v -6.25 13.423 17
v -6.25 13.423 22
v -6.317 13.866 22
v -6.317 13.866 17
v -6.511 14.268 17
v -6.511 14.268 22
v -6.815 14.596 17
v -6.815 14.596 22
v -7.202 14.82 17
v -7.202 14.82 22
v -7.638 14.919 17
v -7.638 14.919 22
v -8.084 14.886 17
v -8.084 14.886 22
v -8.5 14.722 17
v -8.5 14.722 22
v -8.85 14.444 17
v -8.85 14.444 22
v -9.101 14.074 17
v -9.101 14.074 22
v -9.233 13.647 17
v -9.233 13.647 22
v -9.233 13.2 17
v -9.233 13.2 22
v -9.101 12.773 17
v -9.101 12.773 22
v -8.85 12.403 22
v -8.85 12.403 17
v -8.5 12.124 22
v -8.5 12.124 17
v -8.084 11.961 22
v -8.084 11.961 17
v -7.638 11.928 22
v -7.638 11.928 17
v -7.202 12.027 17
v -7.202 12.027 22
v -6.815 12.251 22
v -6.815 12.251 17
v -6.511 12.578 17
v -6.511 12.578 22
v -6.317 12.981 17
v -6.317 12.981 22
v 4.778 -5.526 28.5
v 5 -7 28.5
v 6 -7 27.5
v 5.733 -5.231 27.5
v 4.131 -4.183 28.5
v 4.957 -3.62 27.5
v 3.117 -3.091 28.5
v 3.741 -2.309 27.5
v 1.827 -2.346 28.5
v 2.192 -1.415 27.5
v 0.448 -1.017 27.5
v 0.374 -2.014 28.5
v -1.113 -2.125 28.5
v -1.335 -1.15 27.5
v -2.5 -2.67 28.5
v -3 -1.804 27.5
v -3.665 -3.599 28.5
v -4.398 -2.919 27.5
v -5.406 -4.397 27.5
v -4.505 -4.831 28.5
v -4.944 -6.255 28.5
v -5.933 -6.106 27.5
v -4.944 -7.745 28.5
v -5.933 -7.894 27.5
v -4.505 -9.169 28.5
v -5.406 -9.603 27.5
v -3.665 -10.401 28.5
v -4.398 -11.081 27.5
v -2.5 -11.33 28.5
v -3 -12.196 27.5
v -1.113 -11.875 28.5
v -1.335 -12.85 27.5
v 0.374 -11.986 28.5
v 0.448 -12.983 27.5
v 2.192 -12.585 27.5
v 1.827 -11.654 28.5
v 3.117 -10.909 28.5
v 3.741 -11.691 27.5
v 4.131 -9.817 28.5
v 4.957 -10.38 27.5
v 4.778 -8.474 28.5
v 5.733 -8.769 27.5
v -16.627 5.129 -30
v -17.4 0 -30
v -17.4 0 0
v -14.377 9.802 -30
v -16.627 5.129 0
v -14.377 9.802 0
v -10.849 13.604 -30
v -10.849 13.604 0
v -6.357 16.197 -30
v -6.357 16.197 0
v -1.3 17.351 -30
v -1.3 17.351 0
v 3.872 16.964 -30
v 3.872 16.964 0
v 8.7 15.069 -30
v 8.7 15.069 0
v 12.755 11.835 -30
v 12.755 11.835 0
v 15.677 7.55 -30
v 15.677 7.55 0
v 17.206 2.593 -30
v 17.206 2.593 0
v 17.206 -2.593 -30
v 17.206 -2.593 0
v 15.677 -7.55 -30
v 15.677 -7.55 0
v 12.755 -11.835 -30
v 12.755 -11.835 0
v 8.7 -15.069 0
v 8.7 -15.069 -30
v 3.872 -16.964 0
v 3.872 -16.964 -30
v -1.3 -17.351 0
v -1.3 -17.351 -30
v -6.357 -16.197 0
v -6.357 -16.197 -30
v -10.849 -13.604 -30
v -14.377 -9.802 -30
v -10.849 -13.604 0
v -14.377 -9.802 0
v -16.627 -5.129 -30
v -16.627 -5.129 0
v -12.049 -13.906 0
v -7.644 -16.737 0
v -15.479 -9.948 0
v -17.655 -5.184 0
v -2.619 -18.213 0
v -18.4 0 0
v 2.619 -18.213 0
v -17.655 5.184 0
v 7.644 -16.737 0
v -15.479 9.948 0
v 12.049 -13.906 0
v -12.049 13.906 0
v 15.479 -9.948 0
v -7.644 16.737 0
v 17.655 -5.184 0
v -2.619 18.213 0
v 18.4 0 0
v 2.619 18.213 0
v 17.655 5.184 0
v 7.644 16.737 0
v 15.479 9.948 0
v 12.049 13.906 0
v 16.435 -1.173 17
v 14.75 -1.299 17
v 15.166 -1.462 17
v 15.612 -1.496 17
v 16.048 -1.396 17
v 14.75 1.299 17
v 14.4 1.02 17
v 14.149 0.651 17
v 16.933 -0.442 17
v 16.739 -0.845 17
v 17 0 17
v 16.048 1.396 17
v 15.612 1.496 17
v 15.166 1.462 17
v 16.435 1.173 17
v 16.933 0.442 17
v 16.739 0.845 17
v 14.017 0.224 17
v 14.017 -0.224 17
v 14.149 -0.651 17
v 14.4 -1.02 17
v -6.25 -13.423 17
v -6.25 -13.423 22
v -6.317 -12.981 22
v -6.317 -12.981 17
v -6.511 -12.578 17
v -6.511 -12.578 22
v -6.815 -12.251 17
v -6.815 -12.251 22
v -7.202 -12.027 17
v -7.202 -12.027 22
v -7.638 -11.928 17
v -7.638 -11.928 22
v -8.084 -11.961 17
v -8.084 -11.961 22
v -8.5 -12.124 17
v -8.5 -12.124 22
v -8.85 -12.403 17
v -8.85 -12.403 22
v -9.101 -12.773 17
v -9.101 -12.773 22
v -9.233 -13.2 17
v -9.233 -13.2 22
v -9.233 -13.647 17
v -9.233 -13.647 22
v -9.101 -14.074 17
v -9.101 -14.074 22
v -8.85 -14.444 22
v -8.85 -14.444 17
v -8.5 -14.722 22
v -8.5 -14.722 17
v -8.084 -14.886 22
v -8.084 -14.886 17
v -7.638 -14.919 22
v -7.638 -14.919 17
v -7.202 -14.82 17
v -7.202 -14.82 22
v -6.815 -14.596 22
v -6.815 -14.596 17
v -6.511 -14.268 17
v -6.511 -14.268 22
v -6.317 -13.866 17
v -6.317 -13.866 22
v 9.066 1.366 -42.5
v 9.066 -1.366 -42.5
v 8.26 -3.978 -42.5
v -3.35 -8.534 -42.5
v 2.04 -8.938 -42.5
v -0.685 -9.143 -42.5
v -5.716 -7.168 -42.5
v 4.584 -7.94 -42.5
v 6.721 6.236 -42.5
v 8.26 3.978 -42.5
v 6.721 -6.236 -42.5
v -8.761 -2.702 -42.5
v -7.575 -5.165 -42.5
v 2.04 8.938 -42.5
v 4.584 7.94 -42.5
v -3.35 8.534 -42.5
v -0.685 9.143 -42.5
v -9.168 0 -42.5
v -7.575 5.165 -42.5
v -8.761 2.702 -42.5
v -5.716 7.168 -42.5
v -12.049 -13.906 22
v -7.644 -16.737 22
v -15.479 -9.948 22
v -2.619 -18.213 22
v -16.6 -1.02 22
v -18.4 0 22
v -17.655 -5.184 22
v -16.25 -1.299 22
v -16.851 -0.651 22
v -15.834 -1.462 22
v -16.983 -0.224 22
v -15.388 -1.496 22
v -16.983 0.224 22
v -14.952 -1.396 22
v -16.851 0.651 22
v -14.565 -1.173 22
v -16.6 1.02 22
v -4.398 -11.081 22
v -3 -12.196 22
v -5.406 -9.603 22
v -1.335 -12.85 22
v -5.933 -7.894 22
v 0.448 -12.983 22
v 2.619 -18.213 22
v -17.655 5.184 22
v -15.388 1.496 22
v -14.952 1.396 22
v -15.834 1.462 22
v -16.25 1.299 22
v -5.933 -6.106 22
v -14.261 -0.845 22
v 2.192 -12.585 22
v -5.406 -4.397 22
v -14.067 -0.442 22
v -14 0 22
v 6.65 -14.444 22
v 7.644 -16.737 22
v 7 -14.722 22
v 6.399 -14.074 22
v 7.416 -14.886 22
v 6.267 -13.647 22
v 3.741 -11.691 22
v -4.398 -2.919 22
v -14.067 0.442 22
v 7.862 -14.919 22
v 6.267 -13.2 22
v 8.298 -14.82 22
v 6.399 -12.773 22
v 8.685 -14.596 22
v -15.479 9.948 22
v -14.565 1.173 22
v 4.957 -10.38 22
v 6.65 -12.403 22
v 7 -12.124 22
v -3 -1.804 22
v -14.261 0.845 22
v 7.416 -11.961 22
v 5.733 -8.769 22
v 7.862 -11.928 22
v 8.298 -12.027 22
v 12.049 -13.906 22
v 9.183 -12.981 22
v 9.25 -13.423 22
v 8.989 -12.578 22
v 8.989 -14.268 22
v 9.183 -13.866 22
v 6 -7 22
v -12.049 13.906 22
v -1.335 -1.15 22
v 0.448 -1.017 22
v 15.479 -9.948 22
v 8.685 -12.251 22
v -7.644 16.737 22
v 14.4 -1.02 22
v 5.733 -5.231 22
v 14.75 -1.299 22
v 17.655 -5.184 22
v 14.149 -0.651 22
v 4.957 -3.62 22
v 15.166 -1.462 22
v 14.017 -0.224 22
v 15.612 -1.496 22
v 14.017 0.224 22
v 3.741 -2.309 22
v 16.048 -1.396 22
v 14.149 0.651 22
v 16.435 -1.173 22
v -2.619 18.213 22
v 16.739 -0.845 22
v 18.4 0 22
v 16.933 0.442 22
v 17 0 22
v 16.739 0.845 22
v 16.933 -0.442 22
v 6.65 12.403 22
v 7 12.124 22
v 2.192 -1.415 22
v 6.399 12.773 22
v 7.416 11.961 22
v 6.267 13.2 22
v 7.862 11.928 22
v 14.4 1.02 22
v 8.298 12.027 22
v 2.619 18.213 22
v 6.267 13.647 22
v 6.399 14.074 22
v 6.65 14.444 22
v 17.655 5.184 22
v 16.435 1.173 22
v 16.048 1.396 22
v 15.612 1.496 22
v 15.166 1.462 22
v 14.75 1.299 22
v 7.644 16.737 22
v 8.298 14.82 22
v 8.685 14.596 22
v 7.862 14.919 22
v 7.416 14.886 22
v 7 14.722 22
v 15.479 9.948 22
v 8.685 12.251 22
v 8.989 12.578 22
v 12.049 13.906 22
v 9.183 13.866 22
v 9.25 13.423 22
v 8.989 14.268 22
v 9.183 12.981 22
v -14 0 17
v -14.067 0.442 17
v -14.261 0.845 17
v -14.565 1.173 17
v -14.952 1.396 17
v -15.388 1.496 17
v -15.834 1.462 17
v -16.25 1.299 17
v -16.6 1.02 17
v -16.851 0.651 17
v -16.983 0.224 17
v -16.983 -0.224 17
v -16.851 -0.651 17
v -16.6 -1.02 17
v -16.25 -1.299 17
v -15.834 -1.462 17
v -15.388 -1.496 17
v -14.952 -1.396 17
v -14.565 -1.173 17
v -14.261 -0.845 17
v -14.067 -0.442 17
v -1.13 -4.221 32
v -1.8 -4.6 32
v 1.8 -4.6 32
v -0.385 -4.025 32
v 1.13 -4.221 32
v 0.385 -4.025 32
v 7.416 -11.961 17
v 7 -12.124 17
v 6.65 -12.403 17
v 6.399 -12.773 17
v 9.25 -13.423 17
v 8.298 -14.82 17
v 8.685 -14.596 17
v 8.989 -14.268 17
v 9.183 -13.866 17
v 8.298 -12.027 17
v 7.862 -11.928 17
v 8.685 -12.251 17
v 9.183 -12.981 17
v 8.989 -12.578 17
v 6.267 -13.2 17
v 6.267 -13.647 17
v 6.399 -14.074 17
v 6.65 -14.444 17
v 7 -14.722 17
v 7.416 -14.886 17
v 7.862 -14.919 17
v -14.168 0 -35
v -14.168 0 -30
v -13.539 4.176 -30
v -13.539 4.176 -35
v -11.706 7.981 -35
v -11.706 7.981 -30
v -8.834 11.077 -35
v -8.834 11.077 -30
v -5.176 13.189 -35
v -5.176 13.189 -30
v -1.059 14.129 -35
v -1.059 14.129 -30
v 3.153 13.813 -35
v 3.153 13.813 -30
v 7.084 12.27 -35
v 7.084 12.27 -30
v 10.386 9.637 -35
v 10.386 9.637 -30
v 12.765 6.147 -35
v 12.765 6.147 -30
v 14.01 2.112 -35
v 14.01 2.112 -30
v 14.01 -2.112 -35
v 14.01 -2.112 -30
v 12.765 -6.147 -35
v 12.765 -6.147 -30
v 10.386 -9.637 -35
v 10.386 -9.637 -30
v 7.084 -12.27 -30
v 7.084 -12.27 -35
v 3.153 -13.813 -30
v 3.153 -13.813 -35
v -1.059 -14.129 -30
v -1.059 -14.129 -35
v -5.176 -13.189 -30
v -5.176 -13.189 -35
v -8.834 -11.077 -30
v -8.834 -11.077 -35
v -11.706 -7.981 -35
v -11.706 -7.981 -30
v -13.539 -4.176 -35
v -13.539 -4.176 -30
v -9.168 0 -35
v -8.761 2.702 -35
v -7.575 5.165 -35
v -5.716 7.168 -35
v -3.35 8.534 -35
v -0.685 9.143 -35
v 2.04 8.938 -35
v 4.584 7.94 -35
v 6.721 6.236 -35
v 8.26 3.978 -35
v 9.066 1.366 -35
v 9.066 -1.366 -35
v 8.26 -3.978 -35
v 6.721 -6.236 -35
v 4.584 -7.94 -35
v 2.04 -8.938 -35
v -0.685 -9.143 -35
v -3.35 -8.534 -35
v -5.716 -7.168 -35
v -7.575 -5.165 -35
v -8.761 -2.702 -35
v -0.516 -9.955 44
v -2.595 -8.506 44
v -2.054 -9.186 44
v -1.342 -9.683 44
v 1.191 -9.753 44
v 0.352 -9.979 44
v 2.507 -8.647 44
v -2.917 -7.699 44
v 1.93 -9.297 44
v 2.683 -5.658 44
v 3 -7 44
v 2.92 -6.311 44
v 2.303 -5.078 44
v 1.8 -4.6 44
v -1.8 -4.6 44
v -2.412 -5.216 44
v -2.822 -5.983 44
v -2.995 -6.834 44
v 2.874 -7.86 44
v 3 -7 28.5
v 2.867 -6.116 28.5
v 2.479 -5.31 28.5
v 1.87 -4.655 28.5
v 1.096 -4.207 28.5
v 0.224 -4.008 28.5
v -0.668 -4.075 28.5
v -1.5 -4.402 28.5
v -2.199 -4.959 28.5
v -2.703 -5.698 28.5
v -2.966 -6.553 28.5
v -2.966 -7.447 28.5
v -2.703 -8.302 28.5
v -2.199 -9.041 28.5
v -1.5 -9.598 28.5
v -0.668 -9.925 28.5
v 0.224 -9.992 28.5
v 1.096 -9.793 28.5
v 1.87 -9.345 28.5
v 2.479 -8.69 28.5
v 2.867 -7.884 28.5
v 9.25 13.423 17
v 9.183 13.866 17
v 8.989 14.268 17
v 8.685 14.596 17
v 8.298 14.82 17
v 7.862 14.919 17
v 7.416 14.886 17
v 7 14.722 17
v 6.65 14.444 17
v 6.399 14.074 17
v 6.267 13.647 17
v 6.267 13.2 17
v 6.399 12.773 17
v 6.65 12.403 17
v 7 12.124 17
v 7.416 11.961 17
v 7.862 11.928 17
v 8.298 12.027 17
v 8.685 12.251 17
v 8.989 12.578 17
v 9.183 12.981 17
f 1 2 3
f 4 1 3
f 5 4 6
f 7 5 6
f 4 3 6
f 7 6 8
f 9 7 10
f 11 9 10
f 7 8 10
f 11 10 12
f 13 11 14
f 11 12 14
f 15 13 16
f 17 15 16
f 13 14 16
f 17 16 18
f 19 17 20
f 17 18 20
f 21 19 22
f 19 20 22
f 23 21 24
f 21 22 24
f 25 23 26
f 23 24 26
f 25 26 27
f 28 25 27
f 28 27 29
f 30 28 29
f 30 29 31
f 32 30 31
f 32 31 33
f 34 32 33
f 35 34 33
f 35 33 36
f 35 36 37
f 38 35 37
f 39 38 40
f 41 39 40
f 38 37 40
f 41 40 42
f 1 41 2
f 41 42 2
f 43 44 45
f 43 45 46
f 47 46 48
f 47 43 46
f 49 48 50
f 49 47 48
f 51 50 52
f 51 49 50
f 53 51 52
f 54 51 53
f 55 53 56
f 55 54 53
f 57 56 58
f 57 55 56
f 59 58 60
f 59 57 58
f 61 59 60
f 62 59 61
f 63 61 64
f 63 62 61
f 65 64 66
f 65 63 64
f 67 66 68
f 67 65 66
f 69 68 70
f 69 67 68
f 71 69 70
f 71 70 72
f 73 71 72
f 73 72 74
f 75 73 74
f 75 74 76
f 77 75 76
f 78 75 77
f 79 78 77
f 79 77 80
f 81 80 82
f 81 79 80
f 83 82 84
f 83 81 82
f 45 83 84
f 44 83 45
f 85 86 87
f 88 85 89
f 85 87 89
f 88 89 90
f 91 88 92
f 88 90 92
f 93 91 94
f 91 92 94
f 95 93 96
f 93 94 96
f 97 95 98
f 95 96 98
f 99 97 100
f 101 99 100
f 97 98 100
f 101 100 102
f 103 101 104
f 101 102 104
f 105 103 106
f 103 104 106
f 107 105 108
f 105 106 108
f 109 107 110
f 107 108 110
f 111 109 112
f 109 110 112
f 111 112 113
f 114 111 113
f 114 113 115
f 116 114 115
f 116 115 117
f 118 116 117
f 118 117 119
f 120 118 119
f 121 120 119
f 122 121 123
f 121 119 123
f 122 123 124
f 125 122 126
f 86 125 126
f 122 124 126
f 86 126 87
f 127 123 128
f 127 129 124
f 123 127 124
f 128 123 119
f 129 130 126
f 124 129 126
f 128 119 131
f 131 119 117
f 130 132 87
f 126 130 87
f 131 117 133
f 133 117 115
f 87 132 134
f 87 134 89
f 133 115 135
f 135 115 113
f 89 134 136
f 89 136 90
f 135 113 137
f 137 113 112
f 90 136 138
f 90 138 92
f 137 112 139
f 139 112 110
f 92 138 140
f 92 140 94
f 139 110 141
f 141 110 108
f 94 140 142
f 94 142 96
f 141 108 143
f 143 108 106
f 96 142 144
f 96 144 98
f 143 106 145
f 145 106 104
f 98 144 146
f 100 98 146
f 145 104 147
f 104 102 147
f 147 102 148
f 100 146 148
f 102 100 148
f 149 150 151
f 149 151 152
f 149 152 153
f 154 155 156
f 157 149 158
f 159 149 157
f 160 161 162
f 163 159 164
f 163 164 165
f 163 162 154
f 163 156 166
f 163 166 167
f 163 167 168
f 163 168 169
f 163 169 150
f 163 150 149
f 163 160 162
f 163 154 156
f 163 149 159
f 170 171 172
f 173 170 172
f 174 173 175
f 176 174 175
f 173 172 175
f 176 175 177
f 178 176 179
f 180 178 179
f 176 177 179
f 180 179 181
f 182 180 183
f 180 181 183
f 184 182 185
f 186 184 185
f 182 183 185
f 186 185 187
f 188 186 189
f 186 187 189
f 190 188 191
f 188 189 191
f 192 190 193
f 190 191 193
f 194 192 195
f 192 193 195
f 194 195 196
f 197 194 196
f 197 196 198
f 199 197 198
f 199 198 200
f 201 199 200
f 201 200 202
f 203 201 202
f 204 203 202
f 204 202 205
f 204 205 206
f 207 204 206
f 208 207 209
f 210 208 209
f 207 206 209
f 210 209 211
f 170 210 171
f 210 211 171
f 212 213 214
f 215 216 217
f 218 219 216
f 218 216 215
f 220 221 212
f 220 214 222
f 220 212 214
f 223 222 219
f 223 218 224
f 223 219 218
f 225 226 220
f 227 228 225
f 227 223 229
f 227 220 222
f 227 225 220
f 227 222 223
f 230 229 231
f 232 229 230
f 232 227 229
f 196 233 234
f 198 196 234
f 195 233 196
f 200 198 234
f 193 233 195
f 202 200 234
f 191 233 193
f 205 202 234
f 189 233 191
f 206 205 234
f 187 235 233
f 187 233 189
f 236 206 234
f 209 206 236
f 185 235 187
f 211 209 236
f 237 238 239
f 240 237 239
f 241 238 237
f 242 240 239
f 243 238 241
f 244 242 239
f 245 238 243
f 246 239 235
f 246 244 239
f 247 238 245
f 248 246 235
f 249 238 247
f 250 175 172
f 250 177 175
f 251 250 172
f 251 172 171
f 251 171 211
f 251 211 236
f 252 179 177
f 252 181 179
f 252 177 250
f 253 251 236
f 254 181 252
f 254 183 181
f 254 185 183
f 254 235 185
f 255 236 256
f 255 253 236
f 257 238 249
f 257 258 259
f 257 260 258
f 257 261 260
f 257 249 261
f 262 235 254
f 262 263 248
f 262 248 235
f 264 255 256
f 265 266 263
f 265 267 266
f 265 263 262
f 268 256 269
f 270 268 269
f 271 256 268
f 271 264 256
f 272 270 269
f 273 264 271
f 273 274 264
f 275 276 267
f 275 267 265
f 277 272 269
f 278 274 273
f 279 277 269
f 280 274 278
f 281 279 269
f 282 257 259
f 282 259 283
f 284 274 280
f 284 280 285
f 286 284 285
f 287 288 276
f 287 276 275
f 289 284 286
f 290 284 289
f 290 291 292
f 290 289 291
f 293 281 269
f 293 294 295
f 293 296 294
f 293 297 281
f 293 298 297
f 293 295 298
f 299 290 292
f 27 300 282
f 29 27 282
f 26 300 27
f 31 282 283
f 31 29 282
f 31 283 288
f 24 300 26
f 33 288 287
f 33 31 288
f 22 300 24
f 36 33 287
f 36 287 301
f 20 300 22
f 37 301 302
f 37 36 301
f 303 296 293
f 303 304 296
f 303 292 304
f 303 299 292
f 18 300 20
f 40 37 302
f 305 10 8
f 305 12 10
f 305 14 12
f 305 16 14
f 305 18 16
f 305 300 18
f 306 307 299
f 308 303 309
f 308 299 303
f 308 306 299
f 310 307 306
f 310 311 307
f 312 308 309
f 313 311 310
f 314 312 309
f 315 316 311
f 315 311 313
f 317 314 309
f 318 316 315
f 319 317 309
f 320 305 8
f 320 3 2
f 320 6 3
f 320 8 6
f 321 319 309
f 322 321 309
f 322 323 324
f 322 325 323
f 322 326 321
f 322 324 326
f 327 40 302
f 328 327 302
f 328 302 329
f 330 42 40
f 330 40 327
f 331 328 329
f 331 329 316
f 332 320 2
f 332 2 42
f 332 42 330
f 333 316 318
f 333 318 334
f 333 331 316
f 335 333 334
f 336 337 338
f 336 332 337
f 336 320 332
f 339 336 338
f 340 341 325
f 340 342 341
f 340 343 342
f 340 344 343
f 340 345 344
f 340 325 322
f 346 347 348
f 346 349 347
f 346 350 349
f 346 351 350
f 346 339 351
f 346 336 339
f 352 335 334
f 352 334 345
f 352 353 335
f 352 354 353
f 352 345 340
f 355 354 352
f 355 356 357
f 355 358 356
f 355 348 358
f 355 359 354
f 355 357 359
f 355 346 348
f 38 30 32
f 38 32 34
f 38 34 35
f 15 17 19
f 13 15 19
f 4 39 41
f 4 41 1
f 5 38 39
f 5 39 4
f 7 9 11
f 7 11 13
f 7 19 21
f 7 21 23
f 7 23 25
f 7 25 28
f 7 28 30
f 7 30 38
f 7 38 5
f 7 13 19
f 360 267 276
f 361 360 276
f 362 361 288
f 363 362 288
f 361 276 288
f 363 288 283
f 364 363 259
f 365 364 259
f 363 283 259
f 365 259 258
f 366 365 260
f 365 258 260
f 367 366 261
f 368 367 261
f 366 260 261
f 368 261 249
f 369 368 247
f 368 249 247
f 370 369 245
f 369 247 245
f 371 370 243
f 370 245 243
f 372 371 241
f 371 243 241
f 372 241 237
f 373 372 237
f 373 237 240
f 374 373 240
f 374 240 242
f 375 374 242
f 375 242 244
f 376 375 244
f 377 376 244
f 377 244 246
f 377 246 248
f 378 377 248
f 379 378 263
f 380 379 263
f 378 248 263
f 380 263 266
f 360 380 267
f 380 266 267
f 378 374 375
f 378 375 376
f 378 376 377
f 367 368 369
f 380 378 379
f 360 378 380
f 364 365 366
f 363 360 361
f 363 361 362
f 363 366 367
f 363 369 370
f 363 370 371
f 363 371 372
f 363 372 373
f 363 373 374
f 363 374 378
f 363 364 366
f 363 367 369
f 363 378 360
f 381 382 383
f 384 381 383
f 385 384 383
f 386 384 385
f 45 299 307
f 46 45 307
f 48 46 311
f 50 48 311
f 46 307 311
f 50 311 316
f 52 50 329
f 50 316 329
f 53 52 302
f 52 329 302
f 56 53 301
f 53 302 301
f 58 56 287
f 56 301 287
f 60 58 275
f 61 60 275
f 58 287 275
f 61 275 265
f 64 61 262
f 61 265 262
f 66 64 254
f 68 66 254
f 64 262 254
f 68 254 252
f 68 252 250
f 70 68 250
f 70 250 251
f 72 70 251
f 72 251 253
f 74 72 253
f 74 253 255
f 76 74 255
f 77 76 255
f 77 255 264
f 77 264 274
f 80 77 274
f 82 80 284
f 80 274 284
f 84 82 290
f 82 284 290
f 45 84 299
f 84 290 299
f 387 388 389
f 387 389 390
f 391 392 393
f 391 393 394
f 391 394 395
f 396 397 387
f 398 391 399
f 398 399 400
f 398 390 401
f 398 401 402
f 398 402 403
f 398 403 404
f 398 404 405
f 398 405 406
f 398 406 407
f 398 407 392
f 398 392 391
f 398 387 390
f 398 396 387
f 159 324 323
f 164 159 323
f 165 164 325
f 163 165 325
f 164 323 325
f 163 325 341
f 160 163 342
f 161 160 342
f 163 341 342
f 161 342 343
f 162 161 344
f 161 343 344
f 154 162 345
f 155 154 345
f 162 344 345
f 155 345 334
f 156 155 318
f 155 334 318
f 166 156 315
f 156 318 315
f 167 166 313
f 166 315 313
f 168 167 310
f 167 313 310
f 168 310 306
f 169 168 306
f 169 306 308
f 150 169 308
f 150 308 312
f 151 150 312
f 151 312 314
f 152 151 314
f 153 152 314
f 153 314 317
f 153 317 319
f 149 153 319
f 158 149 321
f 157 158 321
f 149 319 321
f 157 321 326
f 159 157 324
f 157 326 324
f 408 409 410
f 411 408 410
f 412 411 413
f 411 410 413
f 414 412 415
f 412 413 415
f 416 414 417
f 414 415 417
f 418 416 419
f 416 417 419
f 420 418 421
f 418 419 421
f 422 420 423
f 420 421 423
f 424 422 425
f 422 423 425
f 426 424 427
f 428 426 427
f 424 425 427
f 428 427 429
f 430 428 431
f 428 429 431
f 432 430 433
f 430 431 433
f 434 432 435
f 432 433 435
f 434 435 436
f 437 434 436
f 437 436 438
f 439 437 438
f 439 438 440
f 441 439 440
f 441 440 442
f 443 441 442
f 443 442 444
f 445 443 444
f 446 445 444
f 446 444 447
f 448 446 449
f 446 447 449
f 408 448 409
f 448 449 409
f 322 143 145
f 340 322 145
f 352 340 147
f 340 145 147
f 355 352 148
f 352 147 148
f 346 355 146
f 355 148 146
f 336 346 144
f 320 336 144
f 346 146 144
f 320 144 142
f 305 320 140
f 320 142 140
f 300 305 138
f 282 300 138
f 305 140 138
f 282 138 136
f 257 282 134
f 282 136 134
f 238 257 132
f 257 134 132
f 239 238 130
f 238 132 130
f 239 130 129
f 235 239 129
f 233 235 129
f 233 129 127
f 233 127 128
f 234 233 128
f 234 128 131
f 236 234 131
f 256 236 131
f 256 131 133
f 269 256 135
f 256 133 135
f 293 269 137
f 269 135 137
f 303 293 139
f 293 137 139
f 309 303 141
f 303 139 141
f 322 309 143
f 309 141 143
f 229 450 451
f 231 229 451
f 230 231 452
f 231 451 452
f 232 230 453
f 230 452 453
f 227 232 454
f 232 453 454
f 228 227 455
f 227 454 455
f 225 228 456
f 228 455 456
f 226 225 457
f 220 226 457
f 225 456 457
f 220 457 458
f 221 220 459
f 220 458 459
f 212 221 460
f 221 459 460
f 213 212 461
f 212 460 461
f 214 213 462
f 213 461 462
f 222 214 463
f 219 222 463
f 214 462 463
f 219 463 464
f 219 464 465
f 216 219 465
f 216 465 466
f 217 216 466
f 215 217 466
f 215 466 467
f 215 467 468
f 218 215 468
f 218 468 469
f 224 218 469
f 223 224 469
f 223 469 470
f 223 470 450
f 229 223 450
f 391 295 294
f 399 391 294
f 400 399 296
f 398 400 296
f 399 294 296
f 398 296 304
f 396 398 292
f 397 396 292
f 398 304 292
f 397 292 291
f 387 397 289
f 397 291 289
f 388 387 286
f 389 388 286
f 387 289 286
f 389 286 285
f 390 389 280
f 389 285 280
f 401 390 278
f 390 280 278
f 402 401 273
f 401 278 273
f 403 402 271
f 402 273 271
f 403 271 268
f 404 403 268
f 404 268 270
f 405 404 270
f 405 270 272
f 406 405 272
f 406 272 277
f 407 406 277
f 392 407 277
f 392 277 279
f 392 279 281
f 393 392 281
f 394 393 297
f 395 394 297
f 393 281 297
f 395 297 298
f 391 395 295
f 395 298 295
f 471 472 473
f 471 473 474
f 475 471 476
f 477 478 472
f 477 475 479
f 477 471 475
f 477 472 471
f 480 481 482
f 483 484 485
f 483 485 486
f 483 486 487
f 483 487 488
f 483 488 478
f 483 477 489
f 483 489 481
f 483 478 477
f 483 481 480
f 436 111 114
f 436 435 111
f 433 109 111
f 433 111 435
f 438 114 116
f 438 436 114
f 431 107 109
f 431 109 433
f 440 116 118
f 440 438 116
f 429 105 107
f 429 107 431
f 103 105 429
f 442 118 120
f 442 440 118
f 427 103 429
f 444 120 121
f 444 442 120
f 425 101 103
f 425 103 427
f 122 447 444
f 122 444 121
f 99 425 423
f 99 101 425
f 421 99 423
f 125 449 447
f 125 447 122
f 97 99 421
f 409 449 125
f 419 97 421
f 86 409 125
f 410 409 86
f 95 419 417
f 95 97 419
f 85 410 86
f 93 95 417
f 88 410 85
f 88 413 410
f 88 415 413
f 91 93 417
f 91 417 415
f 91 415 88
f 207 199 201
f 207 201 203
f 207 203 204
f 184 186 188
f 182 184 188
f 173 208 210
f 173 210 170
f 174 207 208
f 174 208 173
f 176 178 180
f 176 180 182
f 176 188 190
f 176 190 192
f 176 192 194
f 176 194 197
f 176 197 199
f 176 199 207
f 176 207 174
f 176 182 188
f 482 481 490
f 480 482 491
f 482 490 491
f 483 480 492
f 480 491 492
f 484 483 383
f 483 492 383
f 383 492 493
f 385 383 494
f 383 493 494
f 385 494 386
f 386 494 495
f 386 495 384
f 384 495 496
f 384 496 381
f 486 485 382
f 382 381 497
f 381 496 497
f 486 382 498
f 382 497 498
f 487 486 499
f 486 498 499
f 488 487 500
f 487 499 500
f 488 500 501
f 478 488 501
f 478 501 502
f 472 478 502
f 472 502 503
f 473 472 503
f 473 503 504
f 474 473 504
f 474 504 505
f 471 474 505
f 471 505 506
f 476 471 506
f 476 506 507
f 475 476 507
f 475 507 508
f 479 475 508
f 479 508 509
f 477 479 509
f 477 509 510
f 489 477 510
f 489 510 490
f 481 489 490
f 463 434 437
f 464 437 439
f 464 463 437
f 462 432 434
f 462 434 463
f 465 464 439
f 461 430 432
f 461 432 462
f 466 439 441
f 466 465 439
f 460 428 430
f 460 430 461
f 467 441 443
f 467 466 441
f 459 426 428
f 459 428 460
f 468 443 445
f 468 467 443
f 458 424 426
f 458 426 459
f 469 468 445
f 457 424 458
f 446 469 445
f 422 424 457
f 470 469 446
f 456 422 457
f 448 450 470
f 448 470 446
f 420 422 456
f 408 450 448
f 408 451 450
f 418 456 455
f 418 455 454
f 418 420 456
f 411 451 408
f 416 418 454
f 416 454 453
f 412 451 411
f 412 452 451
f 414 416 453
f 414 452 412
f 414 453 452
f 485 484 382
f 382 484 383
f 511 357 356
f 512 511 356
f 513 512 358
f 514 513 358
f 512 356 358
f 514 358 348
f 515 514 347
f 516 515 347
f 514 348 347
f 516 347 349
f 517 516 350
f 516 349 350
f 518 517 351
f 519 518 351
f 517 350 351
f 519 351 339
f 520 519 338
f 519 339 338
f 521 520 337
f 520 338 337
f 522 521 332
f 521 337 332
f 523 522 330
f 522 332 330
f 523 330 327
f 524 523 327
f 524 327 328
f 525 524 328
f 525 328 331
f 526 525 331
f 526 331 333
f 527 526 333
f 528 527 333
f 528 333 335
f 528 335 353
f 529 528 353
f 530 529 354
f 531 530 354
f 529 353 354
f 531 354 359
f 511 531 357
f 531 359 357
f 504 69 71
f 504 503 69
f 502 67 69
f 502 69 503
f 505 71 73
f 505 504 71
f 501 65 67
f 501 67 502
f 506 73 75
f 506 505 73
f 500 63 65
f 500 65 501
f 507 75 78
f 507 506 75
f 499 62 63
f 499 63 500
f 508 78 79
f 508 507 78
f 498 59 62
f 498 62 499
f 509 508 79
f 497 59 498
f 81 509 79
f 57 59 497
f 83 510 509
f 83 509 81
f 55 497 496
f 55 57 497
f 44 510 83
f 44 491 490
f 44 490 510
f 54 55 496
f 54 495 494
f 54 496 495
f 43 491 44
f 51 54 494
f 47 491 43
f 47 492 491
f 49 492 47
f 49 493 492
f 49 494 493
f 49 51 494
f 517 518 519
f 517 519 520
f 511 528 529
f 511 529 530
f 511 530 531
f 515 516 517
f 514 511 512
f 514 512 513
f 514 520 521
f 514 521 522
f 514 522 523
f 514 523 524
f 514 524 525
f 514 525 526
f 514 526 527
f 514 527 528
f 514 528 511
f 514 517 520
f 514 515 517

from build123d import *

# Parameters (mm, degrees)
SKETCH1_R               = 18.4
BOSS_EXTRUDE1_DEPTH     = 22
SKETCH2_R               = 17.4
BOSS_EXTRUDE2_DEPTH     = 30
SKETCH3_R               = 6
BOSS_EXTRUDE3_DEPTH     = 6.5
CHAMFER1_SIZE           = 1
SKETCH4_R               = 3
BOSS_EXTRUDE4_DEPTH     = 15.5
CUT_EXTRUDE1_DEPTH      = 15.5
CUT_EXTRUDE1_DEPTH_BACK = 15.5
SKETCH5_W               = 12
SKETCH5_H               = 0.6
SKETCH6_R               = 1.5
CUT_EXTRUDE2_DEPTH      = 5
SKETCH7_R               = 9.168264785
BOSS_EXTRUDE5_DEPTH     = 12.5
SKETCH8_R               = 14.168264785
BOSS_EXTRUDE6_DEPTH     = 5


with BuildPart() as part:
    # Sketch1 → Boss-Extrude1 (new body)
    with BuildSketch(Plane.XY):
        Circle(SKETCH1_R)
    extrude(amount=BOSS_EXTRUDE1_DEPTH)

    # Sketch2 → Boss-Extrude2 (add)
    with BuildSketch(Plane(origin=(0, 0, 0), x_dir=(-1, 0, 0), z_dir=(0, 0, -1))):
        Circle(SKETCH2_R)
    extrude(amount=BOSS_EXTRUDE2_DEPTH)

    # Sketch3 → Boss-Extrude3 (add)
    with BuildSketch(Plane.XY.offset(22)):
        with Locations((0, -7)):
            Circle(SKETCH3_R)
    extrude(amount=BOSS_EXTRUDE3_DEPTH)

    # Chamfer1
    chamfer1_edges = [part.edges().sort_by_distance(p)[0] for p in [
        (-6, -7, 28.5),
    ]]
    chamfer(chamfer1_edges, length=CHAMFER1_SIZE)

    # Sketch4 → Boss-Extrude4 (add)
    with BuildSketch(Plane.XY.offset(28.5)):
        with Locations((0, -7)):
            Circle(SKETCH4_R)
    extrude(amount=BOSS_EXTRUDE4_DEPTH)

    # Sketch5 → Cut-Extrude1 (cut, two sides: drawn at the far end of the back side and taken through both)
    with BuildSketch(Plane(origin=(0, 0, 0), x_dir=(0, 0, -1), z_dir=(1, 0, 0)).offset(-CUT_EXTRUDE1_DEPTH_BACK)):
        with Locations((-38, -4.3)):
            Rectangle(SKETCH5_W, SKETCH5_H)
    extrude(amount=CUT_EXTRUDE1_DEPTH + CUT_EXTRUDE1_DEPTH_BACK, mode=Mode.SUBTRACT)

    # Sketch6 → Cut-Extrude2 (cut)
    with BuildSketch(Plane.XY.offset(22)):
        with Locations((-7.75, 13.423393759)):
            Circle(SKETCH6_R)
        with Locations((7.75, 13.423393759)):
            Circle(SKETCH6_R)
        with Locations((15.5, 0)):
            Circle(SKETCH6_R)
        with Locations((-15.5, 0)):
            Circle(SKETCH6_R)
        with Locations((-7.75, -13.423393759)):
            Circle(SKETCH6_R)
        with Locations((7.75, -13.423393759)):
            Circle(SKETCH6_R)
    extrude(amount=-CUT_EXTRUDE2_DEPTH, mode=Mode.SUBTRACT)

    # Sketch7 → Boss-Extrude5 (add)
    with BuildSketch(Plane(origin=(0, 0, -30), x_dir=(-1, 0, 0), z_dir=(0, 0, -1))):
        Circle(SKETCH7_R)
    extrude(amount=BOSS_EXTRUDE5_DEPTH)

    # Sketch8 → Boss-Extrude6 (add)
    with BuildSketch(Plane(origin=(0, 0, -30), x_dir=(-1, 0, 0), z_dir=(0, 0, -1))):
        Circle(SKETCH8_R)
    extrude(amount=BOSS_EXTRUDE6_DEPTH)


solid = part.part
